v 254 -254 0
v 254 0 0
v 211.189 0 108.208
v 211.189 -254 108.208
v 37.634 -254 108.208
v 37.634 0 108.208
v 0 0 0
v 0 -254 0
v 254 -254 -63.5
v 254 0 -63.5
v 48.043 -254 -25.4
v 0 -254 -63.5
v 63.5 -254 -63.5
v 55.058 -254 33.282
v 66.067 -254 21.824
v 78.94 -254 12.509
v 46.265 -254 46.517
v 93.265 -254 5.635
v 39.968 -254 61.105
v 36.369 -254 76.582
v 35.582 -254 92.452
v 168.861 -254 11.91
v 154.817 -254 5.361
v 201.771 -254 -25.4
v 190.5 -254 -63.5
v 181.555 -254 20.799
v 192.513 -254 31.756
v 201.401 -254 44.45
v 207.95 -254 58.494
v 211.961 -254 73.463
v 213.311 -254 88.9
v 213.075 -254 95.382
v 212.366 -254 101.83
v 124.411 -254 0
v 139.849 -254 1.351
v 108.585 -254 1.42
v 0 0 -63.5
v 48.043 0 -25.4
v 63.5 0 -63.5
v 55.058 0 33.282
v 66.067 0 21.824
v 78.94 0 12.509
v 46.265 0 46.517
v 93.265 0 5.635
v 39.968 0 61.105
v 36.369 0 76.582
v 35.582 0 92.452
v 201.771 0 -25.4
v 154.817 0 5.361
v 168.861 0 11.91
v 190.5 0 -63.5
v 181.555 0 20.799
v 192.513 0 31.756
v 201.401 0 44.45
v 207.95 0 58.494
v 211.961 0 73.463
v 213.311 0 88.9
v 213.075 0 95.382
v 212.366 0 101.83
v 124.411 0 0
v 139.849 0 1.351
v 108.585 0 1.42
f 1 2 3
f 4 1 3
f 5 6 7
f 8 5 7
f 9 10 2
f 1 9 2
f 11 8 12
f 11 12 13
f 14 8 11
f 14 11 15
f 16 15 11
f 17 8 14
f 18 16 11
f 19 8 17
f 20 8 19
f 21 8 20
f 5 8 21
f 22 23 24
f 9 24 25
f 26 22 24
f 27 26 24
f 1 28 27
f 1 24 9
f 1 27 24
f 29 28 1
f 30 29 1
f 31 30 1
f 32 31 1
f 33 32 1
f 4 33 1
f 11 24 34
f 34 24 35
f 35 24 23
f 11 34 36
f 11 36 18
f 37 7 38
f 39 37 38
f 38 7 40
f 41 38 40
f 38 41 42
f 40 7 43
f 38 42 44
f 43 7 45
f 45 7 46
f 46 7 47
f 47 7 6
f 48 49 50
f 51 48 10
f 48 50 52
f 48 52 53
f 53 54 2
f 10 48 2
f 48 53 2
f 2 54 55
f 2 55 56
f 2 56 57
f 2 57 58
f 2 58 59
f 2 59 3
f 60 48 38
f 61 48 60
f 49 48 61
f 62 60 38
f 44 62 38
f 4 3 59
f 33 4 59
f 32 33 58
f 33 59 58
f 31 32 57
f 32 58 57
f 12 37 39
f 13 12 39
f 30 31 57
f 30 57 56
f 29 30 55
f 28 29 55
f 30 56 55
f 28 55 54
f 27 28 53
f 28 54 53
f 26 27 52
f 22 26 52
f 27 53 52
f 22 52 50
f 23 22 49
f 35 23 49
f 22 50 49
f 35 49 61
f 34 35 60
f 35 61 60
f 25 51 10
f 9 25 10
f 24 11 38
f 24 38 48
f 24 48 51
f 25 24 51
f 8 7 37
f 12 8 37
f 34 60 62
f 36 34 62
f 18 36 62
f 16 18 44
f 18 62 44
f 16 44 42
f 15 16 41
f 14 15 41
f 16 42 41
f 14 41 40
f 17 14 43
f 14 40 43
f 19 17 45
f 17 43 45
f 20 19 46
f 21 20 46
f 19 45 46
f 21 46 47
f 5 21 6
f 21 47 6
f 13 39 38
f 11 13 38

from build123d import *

# Parameters (mm, degrees)
F1_DEPTH = 254


with BuildPart() as f1:
    # F0 (on Front) → F1 (new body)
    with BuildSketch(Plane.XZ):
        Polygon((124.411419, 0), (0, 0), (0, -63.5), (63.5, -63.5), (48.04277, -25.4), (201.770738, -25.4), (190.5, -63.5), (254, -63.5), (254, 0), align=None)
        with BuildLine():
            Line((37.633552, 108.208333), (0, 0))
            Line((0, 0), (124.411419, 0))
            ThreePointArc((124.411419, 0), (55.058262, 33.282111), (37.633552, 108.208333))
        make_face()
        with BuildLine():
            ThreePointArc((213.311419, 88.9), (187.273212, 26.038207), (124.411419, 0))
            Line((124.411419, 0), (254, 0))
            Line((254, 0), (211.189286, 108.208333))
            ThreePointArc((211.189286, 108.208333), (212.779293, 98.612301), (213.311419, 88.9))
        make_face()
    extrude(amount=F1_DEPTH)


solid = f1.part
